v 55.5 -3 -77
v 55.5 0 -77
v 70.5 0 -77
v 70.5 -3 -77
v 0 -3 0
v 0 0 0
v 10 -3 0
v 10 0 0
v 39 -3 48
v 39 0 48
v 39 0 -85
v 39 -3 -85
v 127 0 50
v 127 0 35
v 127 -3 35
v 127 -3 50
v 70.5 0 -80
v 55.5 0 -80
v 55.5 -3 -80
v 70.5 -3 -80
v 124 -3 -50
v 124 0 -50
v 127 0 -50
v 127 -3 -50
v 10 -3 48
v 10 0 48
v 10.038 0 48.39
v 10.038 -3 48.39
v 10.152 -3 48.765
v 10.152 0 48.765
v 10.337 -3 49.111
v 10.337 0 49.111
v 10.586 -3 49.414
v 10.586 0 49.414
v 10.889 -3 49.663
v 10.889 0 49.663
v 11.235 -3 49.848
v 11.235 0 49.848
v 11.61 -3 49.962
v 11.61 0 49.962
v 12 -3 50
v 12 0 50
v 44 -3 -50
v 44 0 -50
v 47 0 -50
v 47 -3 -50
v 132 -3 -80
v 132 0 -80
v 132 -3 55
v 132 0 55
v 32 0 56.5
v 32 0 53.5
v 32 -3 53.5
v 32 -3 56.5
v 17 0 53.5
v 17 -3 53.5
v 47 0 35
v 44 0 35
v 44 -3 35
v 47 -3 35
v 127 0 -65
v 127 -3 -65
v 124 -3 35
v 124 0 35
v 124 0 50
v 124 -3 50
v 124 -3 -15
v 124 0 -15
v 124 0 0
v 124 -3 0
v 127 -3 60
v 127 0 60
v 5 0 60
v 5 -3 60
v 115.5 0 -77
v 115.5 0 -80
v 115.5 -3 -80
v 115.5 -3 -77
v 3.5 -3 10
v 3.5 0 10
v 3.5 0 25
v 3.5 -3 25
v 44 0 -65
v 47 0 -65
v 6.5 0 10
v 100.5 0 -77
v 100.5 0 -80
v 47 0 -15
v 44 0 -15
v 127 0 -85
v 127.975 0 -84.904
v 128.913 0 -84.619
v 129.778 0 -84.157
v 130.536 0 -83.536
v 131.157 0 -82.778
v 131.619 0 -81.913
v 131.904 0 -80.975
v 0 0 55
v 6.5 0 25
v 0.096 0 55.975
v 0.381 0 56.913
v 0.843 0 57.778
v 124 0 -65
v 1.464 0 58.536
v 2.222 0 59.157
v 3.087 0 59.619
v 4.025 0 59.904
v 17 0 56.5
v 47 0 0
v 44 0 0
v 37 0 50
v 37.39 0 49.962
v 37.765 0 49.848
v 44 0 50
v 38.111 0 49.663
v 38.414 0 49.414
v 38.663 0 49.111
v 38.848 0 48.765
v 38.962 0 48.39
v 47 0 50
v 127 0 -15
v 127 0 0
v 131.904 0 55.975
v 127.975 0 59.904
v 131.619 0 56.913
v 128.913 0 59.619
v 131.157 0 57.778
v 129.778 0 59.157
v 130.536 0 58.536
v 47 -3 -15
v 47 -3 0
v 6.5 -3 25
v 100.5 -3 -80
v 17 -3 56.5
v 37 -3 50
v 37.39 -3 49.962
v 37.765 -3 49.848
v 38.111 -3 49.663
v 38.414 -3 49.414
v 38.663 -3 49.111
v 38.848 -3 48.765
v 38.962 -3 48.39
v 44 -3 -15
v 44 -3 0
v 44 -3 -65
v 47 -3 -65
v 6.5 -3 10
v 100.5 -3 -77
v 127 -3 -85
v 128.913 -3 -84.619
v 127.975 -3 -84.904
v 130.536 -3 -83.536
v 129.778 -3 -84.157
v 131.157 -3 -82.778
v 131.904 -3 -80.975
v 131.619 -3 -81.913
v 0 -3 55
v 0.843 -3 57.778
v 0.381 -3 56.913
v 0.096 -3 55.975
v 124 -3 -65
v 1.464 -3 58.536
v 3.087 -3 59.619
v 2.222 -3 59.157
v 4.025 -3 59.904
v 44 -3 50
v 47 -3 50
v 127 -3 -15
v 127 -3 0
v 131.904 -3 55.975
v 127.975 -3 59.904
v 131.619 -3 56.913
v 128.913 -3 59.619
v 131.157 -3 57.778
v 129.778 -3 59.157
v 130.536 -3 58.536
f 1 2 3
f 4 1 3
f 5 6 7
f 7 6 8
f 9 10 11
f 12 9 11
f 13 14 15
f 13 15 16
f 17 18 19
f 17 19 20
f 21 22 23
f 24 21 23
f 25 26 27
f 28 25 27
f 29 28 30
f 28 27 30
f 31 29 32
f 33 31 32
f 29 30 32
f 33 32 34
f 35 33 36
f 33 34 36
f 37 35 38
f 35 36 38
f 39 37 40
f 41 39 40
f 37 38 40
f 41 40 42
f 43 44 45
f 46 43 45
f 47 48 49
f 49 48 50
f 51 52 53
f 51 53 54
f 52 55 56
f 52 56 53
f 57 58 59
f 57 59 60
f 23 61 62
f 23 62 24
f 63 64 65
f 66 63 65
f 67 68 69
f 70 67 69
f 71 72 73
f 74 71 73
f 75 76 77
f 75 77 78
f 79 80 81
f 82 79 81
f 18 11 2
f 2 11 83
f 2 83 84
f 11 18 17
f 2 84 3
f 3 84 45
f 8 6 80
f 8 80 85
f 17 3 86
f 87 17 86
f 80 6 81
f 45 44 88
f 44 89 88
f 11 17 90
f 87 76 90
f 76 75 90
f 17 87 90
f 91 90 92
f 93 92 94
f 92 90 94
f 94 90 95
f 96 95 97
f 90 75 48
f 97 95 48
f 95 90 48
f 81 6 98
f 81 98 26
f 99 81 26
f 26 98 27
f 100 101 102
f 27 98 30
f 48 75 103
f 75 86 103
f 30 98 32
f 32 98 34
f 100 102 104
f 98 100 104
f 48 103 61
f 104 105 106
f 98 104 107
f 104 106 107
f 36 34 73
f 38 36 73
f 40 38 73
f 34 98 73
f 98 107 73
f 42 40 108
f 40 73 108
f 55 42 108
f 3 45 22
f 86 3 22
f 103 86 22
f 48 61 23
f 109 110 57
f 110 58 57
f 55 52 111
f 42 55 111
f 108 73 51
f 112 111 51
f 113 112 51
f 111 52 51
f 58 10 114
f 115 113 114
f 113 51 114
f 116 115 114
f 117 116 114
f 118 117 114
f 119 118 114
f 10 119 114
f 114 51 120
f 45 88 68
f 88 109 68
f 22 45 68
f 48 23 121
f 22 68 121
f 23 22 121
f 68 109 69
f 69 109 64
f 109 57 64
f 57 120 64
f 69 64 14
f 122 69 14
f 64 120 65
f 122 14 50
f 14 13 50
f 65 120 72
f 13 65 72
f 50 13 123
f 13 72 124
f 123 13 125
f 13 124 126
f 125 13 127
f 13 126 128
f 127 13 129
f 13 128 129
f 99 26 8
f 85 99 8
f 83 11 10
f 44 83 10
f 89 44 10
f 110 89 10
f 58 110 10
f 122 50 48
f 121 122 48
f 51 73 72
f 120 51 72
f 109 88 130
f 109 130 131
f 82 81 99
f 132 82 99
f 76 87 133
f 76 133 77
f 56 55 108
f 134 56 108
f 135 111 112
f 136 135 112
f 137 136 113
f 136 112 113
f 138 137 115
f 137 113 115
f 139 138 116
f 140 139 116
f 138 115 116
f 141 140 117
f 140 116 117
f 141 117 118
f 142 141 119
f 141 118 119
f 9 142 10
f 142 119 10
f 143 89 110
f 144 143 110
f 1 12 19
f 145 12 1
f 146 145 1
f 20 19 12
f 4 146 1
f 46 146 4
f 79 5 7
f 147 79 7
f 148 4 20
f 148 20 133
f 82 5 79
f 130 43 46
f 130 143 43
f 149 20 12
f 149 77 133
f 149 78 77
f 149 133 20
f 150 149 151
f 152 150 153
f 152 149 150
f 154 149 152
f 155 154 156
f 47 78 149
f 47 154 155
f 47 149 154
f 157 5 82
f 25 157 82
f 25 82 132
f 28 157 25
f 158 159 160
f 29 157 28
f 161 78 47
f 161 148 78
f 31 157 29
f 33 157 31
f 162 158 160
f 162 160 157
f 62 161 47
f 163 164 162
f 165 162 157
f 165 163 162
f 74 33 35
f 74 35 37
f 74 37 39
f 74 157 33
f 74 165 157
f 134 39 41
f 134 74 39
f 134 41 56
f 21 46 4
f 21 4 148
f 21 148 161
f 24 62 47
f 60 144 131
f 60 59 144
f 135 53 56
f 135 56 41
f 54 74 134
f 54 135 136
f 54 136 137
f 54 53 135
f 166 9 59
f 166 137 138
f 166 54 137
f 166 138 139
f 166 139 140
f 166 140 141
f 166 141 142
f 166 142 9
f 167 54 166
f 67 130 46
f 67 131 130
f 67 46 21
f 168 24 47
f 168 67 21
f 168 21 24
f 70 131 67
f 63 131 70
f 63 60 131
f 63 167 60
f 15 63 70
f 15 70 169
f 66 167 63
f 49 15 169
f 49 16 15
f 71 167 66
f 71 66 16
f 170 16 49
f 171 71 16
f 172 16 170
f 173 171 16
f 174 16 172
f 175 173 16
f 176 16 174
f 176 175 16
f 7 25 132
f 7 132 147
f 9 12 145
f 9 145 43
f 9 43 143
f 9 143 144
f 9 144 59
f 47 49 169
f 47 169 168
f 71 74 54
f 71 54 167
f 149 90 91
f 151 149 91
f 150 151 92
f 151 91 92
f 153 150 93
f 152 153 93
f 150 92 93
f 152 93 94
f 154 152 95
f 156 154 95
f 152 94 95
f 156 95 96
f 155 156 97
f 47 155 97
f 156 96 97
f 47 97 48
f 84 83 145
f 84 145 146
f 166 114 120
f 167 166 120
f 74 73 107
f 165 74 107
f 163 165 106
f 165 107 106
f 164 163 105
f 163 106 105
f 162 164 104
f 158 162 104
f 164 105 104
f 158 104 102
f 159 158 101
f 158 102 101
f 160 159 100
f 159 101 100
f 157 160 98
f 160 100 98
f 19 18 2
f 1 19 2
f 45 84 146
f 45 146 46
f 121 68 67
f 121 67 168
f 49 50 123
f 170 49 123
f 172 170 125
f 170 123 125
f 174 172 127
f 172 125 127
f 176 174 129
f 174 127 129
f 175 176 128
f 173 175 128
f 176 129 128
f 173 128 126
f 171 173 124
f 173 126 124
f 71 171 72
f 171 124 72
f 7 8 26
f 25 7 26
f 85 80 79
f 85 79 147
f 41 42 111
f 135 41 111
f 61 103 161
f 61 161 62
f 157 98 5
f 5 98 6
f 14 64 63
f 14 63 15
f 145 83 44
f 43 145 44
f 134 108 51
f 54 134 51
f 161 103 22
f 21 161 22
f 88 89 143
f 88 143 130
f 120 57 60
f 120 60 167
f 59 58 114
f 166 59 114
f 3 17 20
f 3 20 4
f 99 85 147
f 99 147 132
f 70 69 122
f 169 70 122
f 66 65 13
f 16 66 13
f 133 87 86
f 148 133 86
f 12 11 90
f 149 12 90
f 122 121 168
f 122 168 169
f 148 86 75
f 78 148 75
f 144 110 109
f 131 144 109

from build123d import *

# Parameters (mm, degrees)
F1_W     = 15
F1_H     = 3
F1_W_2   = 3
F1_H_2   = 15
F2_DEPTH = 3


with BuildPart() as f2:
    # F1 (on Front) → F2 (new body)
    with BuildSketch(Plane.XZ):
        with BuildLine():
            Line((0, 55), (0, 0))
            Line((0, 0), (10, 0))
            Line((10, 0), (10, 48))
            ThreePointArc((10, 48), (10.5857864376, 49.4142135624), (12, 50))
            Line((12, 50), (37, 50))
            ThreePointArc((37, 50), (38.4142135624, 49.4142135624), (39, 48))
            Line((39, 48), (39, -85))
            Line((39, -85), (127, -85))
            ThreePointArc((127, -85), (130.5355339059, -83.5355339059), (132, -80))
            Line((132, -80), (132, 55))
            ThreePointArc((132, 55), (130.5355339059, 58.5355339059), (127, 60))
            Line((127, 60), (5, 60))
            ThreePointArc((5, 60), (1.4644660941, 58.5355339059), (0, 55))
        make_face()
        with Locations((63, -78.5)):
            Rectangle(F1_W, F1_H, mode=Mode.SUBTRACT)
        with Locations((45.5, -57.5)):
            Rectangle(F1_W_2, F1_H_2, mode=Mode.SUBTRACT)
        with Locations((108, -78.5)):
            Rectangle(F1_W, F1_H, mode=Mode.SUBTRACT)
        with Locations((125.5, -57.5)):
            Rectangle(F1_W_2, F1_H_2, mode=Mode.SUBTRACT)
        with Locations((5, 17.5)):
            Rectangle(F1_W_2, F1_H_2, mode=Mode.SUBTRACT)
        with Locations((45.5, -7.5)):
            Rectangle(F1_W_2, F1_H_2, mode=Mode.SUBTRACT)
        with Locations((24.5, 55)):
            Rectangle(F1_W, F1_H, mode=Mode.SUBTRACT)
        with Locations((45.5, 42.5)):
            Rectangle(F1_W_2, F1_H_2, mode=Mode.SUBTRACT)
        with Locations((125.5, -7.5)):
            Rectangle(F1_W_2, F1_H_2, mode=Mode.SUBTRACT)
        with Locations((125.5, 42.5)):
            Rectangle(F1_W_2, F1_H_2, mode=Mode.SUBTRACT)
    extrude(amount=F2_DEPTH)


solid = f2.part
